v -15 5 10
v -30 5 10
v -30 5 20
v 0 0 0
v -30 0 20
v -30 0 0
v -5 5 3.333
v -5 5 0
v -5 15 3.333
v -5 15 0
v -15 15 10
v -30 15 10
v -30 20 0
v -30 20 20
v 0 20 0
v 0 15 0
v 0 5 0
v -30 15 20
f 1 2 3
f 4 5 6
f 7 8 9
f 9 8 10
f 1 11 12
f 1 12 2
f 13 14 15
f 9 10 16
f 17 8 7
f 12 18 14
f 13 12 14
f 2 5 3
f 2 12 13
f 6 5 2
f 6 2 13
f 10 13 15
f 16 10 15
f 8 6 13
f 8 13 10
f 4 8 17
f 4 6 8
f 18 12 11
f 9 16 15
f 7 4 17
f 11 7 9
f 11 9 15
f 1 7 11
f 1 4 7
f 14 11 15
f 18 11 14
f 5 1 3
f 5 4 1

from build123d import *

# Parameters (mm, degrees)
F1_DEPTH = 20
F2_W     = 10
F2_H     = 10
F3_DEPTH = 30.001
F4_W     = 5
F4_H     = 10
F5_DEPTH = 25


with BuildPart() as f1:
    # F0 (on Front) → F1 (new body)
    with BuildSketch(Plane.XZ):
        Polygon((0, 0), (-30, 20), (-30, 0), align=None)
    extrude(amount=-F1_DEPTH)

    # F2 (on face) → F3 (cut, through all)
    with BuildSketch(Plane(origin=(-30, 0, 0), x_dir=(0, -1, 0), z_dir=(-1, 0, 0))):
        with Locations((-10, 15)):
            Rectangle(F2_W, F2_H)
    extrude(amount=-F3_DEPTH, mode=Mode.SUBTRACT)

    # F4 (on Top) → F5 (cut)
    with BuildSketch(Plane.XY):
        with Locations((-2.5, 10)):
            Rectangle(F4_W, F4_H)
    extrude(amount=F5_DEPTH, mode=Mode.SUBTRACT)


solid = f1.part
